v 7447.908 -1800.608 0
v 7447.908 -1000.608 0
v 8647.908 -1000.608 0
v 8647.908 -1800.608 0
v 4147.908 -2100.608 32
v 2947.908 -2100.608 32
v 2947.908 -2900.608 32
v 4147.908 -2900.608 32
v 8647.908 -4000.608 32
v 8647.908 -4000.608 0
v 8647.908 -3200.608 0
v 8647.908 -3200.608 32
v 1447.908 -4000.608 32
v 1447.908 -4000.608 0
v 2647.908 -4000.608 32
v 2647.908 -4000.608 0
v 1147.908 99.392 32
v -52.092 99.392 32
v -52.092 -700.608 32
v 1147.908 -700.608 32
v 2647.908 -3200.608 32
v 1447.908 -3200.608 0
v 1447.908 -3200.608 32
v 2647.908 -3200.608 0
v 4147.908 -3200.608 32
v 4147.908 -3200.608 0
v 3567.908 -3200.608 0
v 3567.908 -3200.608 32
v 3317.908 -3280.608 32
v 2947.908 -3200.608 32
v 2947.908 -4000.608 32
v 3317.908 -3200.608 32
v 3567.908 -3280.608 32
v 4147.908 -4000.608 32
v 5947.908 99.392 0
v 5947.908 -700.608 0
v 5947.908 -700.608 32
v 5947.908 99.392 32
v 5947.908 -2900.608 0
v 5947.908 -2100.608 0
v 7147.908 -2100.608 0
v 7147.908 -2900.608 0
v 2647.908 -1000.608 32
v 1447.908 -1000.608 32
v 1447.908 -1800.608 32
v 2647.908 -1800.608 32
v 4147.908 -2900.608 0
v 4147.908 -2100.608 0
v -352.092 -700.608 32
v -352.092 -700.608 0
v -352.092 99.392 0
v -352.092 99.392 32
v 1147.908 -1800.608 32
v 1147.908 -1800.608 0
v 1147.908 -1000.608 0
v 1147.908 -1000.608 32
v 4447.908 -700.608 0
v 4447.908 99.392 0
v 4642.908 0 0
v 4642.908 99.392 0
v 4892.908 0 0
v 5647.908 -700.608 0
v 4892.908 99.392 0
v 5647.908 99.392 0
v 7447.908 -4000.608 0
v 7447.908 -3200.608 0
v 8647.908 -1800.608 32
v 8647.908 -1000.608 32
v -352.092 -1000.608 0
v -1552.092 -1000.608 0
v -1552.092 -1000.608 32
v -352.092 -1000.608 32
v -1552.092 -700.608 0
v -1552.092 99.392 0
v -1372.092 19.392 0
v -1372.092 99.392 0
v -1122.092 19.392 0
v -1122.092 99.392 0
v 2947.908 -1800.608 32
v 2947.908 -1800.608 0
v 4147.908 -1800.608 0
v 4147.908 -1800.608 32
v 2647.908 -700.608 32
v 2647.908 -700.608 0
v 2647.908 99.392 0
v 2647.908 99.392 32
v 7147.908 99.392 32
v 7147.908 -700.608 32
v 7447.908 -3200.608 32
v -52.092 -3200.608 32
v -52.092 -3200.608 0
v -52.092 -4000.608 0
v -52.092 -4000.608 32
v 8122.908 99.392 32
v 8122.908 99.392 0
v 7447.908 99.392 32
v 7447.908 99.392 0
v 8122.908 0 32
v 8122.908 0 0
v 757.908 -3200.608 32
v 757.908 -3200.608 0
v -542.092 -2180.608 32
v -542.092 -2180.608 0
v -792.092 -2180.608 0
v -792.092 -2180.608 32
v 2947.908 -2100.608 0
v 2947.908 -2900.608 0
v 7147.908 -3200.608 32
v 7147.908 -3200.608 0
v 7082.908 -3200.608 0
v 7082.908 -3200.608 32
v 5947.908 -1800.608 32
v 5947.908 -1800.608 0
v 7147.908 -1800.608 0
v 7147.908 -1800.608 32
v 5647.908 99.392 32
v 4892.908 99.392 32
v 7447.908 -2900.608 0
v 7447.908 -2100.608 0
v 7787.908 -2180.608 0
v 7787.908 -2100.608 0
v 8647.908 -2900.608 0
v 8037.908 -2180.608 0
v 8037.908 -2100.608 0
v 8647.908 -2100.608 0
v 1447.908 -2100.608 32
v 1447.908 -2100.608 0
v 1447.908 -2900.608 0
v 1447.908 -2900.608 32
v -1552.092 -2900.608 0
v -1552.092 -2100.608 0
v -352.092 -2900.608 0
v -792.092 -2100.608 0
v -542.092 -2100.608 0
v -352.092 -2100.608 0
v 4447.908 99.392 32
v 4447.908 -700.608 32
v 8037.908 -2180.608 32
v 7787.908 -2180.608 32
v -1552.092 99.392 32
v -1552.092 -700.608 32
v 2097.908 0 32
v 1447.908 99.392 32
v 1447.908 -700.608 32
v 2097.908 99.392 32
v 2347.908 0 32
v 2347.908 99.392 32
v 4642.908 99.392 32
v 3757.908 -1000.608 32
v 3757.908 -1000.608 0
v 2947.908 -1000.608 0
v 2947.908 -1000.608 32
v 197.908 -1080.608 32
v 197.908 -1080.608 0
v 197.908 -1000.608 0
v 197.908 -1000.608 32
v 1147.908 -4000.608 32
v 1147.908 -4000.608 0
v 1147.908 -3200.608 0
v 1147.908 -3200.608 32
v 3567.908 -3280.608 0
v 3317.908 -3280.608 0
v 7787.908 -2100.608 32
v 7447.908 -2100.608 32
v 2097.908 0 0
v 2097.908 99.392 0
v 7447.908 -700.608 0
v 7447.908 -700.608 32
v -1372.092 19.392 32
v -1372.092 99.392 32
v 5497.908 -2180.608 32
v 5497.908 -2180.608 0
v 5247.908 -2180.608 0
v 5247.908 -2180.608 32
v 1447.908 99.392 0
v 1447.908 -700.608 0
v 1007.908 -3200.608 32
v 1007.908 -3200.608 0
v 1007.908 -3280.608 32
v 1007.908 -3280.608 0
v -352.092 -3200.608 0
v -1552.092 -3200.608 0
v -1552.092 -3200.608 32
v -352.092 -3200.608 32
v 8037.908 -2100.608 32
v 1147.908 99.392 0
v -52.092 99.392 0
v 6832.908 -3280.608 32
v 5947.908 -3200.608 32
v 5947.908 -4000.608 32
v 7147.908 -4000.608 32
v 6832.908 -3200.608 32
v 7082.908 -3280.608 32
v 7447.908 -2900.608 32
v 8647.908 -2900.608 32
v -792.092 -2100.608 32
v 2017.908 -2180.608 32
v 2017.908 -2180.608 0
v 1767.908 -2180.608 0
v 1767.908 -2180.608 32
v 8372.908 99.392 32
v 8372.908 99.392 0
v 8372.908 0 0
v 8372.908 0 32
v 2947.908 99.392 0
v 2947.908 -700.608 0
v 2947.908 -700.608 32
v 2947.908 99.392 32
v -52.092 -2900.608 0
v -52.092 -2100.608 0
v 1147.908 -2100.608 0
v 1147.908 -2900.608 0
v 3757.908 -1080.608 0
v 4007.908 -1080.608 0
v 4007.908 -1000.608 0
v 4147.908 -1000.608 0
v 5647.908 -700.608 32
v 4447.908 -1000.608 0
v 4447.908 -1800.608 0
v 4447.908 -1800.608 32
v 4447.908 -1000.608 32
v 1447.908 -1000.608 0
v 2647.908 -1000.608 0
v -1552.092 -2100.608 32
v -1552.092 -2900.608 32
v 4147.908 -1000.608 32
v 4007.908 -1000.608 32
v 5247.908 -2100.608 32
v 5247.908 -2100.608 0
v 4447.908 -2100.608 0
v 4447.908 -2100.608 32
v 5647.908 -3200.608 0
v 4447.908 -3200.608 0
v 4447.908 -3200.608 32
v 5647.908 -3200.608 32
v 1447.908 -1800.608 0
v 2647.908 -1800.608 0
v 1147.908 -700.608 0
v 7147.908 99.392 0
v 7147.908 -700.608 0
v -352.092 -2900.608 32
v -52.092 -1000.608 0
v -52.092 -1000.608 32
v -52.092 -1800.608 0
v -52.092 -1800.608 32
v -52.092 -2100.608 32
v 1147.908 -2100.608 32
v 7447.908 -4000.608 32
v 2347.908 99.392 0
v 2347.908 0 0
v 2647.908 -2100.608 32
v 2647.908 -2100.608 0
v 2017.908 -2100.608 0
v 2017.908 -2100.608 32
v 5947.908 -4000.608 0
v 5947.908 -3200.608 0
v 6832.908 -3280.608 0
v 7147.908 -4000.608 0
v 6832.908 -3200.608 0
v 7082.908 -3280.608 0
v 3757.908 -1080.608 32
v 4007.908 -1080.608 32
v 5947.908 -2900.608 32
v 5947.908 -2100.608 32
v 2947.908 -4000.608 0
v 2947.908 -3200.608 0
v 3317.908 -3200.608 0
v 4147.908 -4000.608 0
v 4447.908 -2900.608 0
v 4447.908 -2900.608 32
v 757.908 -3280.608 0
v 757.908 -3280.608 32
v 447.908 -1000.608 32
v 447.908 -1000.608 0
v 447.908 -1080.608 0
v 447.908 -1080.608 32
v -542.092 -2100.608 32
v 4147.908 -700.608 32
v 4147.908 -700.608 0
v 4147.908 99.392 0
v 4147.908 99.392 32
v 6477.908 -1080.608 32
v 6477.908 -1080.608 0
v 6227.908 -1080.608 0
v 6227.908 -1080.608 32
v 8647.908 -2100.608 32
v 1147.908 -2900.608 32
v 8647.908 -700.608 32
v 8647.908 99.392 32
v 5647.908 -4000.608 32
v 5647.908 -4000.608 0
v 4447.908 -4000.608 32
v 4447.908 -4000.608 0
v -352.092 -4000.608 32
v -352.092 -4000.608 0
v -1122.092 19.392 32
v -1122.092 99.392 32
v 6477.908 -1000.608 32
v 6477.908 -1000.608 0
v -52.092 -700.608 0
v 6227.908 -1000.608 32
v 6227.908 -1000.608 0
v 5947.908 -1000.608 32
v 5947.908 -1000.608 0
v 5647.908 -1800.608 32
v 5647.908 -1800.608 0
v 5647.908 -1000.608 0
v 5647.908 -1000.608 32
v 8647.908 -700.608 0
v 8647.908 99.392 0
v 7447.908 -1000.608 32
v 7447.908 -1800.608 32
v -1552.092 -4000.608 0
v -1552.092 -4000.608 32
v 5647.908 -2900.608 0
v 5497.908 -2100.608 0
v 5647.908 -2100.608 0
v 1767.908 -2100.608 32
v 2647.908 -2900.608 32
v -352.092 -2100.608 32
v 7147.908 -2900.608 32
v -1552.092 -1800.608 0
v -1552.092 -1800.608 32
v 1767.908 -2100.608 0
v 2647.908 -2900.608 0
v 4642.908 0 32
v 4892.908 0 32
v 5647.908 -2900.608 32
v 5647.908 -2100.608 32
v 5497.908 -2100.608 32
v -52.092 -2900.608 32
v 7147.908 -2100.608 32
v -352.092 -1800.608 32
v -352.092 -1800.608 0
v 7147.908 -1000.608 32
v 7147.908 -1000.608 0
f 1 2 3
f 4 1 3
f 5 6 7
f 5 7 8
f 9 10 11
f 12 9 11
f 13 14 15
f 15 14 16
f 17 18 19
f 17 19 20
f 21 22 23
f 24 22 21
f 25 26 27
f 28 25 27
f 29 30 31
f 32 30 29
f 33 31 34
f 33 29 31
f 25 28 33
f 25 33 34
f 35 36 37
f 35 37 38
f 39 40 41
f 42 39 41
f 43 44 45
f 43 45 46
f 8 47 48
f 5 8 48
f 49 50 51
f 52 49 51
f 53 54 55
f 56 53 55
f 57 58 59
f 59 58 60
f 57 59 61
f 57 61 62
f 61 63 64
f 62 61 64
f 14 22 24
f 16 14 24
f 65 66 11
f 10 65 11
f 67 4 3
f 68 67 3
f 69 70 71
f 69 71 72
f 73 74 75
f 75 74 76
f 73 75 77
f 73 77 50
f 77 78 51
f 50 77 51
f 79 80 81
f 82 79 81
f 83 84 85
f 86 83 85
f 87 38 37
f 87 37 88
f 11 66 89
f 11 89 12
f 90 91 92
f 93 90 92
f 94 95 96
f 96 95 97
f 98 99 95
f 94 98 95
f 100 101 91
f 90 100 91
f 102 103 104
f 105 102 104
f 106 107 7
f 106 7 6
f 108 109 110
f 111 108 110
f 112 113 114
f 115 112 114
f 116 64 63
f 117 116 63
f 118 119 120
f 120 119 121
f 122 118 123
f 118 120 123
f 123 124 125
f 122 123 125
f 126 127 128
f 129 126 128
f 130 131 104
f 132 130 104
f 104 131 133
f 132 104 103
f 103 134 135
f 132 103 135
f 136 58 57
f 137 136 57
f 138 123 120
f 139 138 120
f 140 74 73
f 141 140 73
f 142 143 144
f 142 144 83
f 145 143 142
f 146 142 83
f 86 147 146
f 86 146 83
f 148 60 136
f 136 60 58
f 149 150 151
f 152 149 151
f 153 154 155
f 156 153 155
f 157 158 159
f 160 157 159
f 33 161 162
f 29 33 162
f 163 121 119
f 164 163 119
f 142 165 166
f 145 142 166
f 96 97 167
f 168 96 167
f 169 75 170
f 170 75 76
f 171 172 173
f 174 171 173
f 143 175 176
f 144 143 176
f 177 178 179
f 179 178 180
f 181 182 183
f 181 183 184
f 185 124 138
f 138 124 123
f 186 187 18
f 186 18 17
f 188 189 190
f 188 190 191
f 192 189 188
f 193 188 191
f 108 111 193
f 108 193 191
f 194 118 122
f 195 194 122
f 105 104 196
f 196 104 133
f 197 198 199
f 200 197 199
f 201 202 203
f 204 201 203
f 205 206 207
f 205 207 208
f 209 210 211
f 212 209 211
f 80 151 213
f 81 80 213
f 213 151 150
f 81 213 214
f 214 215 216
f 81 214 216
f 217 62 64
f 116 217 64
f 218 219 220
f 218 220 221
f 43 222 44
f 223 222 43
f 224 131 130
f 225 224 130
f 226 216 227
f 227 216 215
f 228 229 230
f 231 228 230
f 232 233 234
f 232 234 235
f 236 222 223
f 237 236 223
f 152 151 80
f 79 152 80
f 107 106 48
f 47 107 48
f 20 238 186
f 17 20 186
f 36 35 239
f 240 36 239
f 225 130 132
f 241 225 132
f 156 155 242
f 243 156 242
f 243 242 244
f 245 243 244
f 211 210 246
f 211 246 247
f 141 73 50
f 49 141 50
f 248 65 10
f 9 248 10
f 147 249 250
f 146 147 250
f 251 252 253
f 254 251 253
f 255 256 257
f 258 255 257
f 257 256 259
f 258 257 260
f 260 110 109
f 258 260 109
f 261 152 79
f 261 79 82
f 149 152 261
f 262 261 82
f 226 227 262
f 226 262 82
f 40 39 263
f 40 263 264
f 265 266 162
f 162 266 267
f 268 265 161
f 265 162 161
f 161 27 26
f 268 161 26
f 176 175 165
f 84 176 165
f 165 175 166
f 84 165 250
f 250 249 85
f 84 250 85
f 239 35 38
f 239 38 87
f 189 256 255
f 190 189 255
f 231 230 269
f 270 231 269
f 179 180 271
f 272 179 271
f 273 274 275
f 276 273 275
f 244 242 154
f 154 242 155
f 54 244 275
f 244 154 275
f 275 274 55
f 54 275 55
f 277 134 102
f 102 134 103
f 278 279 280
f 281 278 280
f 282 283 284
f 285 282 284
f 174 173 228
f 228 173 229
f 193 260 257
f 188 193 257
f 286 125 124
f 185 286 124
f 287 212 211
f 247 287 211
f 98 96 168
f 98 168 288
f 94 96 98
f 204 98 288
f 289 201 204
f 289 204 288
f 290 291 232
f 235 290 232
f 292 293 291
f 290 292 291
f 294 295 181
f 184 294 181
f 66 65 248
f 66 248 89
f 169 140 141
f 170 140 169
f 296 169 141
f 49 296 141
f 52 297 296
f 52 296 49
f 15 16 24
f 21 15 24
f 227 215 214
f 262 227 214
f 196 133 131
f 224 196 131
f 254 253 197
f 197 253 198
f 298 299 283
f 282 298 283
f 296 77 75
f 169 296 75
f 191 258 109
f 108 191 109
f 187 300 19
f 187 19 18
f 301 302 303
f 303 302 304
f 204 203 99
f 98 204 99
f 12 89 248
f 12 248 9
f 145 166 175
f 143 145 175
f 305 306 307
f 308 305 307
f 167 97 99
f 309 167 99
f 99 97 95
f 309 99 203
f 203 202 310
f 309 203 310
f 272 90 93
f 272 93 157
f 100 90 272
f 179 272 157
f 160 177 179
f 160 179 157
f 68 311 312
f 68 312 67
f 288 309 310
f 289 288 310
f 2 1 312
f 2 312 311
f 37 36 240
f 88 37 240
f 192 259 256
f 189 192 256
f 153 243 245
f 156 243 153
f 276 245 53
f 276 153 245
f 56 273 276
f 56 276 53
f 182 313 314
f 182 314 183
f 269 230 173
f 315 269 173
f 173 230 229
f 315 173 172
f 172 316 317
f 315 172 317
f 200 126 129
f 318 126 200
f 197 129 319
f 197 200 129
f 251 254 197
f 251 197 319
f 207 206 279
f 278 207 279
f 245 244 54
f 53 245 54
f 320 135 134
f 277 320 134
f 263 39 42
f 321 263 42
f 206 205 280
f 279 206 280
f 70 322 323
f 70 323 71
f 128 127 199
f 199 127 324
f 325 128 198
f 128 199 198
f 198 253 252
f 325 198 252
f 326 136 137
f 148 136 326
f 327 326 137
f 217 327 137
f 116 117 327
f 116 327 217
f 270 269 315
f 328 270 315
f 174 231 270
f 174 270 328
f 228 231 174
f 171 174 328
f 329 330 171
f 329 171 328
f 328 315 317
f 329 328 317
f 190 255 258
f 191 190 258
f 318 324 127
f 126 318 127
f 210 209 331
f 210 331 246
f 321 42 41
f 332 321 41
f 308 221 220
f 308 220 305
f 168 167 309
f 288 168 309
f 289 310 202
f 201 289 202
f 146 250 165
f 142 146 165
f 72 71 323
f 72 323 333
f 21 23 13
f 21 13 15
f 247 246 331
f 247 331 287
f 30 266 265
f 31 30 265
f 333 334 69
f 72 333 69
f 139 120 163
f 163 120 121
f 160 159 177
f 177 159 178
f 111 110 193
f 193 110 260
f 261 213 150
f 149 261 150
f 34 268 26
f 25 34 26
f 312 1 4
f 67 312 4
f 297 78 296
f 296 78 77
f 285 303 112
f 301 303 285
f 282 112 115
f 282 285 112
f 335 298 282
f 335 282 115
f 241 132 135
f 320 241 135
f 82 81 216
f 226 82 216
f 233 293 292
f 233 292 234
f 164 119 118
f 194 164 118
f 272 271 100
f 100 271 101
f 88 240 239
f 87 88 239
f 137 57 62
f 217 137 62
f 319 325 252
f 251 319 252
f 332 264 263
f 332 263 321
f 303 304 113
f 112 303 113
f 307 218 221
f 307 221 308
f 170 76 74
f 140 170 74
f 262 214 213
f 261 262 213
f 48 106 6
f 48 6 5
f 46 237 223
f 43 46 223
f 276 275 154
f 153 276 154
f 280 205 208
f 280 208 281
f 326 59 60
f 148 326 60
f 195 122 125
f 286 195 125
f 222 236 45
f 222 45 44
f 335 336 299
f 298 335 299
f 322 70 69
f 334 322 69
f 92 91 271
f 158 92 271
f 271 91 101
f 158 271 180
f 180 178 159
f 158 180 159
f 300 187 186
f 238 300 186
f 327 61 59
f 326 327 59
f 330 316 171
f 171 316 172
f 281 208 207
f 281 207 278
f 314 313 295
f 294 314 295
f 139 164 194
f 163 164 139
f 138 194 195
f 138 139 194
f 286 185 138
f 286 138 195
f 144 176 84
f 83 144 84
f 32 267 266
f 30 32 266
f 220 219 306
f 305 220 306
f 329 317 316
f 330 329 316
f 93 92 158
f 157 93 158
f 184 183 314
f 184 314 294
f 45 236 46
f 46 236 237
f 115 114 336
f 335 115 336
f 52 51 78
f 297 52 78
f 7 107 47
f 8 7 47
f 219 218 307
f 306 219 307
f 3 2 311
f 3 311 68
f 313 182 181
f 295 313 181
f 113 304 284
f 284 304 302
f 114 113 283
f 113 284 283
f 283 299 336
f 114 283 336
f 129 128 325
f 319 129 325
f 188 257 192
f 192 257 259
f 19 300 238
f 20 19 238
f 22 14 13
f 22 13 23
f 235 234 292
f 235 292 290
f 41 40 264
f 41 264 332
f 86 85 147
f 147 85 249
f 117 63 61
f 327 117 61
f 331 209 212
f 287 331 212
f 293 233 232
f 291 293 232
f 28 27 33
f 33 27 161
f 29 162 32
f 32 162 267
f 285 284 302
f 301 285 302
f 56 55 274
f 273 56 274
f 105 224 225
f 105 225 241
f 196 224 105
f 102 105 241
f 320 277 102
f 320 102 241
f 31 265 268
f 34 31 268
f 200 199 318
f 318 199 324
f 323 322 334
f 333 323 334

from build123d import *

# Parameters (mm, degrees)
F0_W     = 1200
F0_H     = 800
F1_DEPTH = 32


with BuildPart() as f1:
    # F0 (on Top) → F1 (new body)
    with BuildSketch(Plane.XY):
        Polygon((-1372.09223, 99.39189), (-1552.09223, 99.39189), (-1552.09223, -700.60811), (-352.09223, -700.60811), (-352.09223, 99.39189), (-1122.09223, 99.39189), (-1122.09223, 19.39189), (-1372.09223, 19.39189), align=None)
        with Locations((547.90777, -300.60811)):
            Rectangle(F0_W, F0_H)
        Polygon((2647.90777, -700.60811), (2647.90777, 99.39189), (2347.90777, 99.39189), (2347.90777, 0), (2097.90777, 0), (2097.90777, 99.39189), (1447.90777, 99.39189), (1447.90777, -700.60811), align=None)
        with Locations((3547.90777, -300.60811)):
            Rectangle(F0_W, F0_H)
        Polygon((5647.90777, -700.60811), (5647.90777, 99.39189), (4892.90777, 99.39189), (4892.90777, 0), (4642.90777, 0), (4642.90777, 99.39189), (4447.90777, 99.39189), (4447.90777, -700.60811), align=None)
        with Locations((6547.90777, -300.60811)):
            Rectangle(F0_W, F0_H)
        Polygon((8647.90777, -700.60811), (8647.90777, 99.39189), (8372.90777, 99.39189), (8372.90777, 0), (8122.90777, 0), (8122.90777, 99.39189), (7447.90777, 99.39189), (7447.90777, -700.60811), align=None)
        with Locations((-952.09223, -1400.60811)):
            Rectangle(F0_W, F0_H)
        Polygon((1147.90777, -1800.60811), (1147.90777, -1000.60811), (447.90777, -1000.60811), (447.90777, -1080.60811), (197.90777, -1080.60811), (197.90777, -1000.60811), (-52.09223, -1000.60811), (-52.09223, -1800.60811), align=None)
        with Locations((2047.90777, -1400.60811)):
            Rectangle(F0_W, F0_H)
        Polygon((4147.90777, -1800.60811), (4147.90777, -1000.60811), (4007.90777, -1000.60811), (4007.90777, -1080.60811), (3757.90777, -1080.60811), (3757.90777, -1000.60811), (2947.90777, -1000.60811), (2947.90777, -1800.60811), align=None)
        with Locations((5047.90777, -1400.60811)):
            Rectangle(F0_W, F0_H)
        Polygon((7147.90777, -1800.60811), (7147.90777, -1000.60811), (6477.90777, -1000.60811), (6477.90777, -1080.60811), (6227.90777, -1080.60811), (6227.90777, -1000.60811), (5947.90777, -1000.60811), (5947.90777, -1800.60811), align=None)
        with Locations((8047.90777, -1400.60811)):
            Rectangle(F0_W, F0_H)
        Polygon((-352.09223, -2900.60811), (-352.09223, -2100.60811), (-542.09223, -2100.60811), (-542.09223, -2180.60811), (-792.09223, -2180.60811), (-792.09223, -2100.60811), (-1552.09223, -2100.60811), (-1552.09223, -2900.60811), align=None)
        with Locations((547.90777, -2500.60811)):
            Rectangle(F0_W, F0_H)
        Polygon((2647.90777, -2900.60811), (2647.90777, -2100.60811), (2017.90777, -2100.60811), (2017.90777, -2180.60811), (1767.90777, -2180.60811), (1767.90777, -2100.60811), (1447.90777, -2100.60811), (1447.90777, -2900.60811), align=None)
        with Locations((3547.90777, -2500.60811)):
            Rectangle(F0_W, F0_H)
        Polygon((5647.90777, -2900.60811), (5647.90777, -2100.60811), (5497.90777, -2100.60811), (5497.90777, -2180.60811), (5247.90777, -2180.60811), (5247.90777, -2100.60811), (4447.90777, -2100.60811), (4447.90777, -2900.60811), align=None)
        with Locations((6547.90777, -2500.60811)):
            Rectangle(F0_W, F0_H)
        Polygon((8647.90777, -2900.60811), (8647.90777, -2100.60811), (8037.90777, -2100.60811), (8037.90777, -2180.60811), (7787.90777, -2180.60811), (7787.90777, -2100.60811), (7447.90777, -2100.60811), (7447.90777, -2900.60811), align=None)
        with Locations((-952.09223, -3600.60811)):
            Rectangle(F0_W, F0_H)
        Polygon((1147.90777, -4000.60811), (1147.90777, -3200.60811), (1007.90777, -3200.60811), (1007.90777, -3280.60811), (757.90777, -3280.60811), (757.90777, -3200.60811), (-52.09223, -3200.60811), (-52.09223, -4000.60811), align=None)
        with Locations((2047.90777, -3600.60811)):
            Rectangle(F0_W, F0_H)
        Polygon((4147.90777, -4000.60811), (4147.90777, -3200.60811), (3567.90777, -3200.60811), (3567.90777, -3280.60811), (3317.90777, -3280.60811), (3317.90777, -3200.60811), (2947.90777, -3200.60811), (2947.90777, -4000.60811), align=None)
        with Locations((5047.90777, -3600.60811)):
            Rectangle(F0_W, F0_H)
        Polygon((7147.90777, -4000.60811), (7147.90777, -3200.60811), (7082.90777, -3200.60811), (7082.90777, -3280.60811), (6832.90777, -3280.60811), (6832.90777, -3200.60811), (5947.90777, -3200.60811), (5947.90777, -4000.60811), align=None)
        with Locations((8047.90777, -3600.60811)):
            Rectangle(F0_W, F0_H)
    extrude(amount=F1_DEPTH)


solid = f1.part
